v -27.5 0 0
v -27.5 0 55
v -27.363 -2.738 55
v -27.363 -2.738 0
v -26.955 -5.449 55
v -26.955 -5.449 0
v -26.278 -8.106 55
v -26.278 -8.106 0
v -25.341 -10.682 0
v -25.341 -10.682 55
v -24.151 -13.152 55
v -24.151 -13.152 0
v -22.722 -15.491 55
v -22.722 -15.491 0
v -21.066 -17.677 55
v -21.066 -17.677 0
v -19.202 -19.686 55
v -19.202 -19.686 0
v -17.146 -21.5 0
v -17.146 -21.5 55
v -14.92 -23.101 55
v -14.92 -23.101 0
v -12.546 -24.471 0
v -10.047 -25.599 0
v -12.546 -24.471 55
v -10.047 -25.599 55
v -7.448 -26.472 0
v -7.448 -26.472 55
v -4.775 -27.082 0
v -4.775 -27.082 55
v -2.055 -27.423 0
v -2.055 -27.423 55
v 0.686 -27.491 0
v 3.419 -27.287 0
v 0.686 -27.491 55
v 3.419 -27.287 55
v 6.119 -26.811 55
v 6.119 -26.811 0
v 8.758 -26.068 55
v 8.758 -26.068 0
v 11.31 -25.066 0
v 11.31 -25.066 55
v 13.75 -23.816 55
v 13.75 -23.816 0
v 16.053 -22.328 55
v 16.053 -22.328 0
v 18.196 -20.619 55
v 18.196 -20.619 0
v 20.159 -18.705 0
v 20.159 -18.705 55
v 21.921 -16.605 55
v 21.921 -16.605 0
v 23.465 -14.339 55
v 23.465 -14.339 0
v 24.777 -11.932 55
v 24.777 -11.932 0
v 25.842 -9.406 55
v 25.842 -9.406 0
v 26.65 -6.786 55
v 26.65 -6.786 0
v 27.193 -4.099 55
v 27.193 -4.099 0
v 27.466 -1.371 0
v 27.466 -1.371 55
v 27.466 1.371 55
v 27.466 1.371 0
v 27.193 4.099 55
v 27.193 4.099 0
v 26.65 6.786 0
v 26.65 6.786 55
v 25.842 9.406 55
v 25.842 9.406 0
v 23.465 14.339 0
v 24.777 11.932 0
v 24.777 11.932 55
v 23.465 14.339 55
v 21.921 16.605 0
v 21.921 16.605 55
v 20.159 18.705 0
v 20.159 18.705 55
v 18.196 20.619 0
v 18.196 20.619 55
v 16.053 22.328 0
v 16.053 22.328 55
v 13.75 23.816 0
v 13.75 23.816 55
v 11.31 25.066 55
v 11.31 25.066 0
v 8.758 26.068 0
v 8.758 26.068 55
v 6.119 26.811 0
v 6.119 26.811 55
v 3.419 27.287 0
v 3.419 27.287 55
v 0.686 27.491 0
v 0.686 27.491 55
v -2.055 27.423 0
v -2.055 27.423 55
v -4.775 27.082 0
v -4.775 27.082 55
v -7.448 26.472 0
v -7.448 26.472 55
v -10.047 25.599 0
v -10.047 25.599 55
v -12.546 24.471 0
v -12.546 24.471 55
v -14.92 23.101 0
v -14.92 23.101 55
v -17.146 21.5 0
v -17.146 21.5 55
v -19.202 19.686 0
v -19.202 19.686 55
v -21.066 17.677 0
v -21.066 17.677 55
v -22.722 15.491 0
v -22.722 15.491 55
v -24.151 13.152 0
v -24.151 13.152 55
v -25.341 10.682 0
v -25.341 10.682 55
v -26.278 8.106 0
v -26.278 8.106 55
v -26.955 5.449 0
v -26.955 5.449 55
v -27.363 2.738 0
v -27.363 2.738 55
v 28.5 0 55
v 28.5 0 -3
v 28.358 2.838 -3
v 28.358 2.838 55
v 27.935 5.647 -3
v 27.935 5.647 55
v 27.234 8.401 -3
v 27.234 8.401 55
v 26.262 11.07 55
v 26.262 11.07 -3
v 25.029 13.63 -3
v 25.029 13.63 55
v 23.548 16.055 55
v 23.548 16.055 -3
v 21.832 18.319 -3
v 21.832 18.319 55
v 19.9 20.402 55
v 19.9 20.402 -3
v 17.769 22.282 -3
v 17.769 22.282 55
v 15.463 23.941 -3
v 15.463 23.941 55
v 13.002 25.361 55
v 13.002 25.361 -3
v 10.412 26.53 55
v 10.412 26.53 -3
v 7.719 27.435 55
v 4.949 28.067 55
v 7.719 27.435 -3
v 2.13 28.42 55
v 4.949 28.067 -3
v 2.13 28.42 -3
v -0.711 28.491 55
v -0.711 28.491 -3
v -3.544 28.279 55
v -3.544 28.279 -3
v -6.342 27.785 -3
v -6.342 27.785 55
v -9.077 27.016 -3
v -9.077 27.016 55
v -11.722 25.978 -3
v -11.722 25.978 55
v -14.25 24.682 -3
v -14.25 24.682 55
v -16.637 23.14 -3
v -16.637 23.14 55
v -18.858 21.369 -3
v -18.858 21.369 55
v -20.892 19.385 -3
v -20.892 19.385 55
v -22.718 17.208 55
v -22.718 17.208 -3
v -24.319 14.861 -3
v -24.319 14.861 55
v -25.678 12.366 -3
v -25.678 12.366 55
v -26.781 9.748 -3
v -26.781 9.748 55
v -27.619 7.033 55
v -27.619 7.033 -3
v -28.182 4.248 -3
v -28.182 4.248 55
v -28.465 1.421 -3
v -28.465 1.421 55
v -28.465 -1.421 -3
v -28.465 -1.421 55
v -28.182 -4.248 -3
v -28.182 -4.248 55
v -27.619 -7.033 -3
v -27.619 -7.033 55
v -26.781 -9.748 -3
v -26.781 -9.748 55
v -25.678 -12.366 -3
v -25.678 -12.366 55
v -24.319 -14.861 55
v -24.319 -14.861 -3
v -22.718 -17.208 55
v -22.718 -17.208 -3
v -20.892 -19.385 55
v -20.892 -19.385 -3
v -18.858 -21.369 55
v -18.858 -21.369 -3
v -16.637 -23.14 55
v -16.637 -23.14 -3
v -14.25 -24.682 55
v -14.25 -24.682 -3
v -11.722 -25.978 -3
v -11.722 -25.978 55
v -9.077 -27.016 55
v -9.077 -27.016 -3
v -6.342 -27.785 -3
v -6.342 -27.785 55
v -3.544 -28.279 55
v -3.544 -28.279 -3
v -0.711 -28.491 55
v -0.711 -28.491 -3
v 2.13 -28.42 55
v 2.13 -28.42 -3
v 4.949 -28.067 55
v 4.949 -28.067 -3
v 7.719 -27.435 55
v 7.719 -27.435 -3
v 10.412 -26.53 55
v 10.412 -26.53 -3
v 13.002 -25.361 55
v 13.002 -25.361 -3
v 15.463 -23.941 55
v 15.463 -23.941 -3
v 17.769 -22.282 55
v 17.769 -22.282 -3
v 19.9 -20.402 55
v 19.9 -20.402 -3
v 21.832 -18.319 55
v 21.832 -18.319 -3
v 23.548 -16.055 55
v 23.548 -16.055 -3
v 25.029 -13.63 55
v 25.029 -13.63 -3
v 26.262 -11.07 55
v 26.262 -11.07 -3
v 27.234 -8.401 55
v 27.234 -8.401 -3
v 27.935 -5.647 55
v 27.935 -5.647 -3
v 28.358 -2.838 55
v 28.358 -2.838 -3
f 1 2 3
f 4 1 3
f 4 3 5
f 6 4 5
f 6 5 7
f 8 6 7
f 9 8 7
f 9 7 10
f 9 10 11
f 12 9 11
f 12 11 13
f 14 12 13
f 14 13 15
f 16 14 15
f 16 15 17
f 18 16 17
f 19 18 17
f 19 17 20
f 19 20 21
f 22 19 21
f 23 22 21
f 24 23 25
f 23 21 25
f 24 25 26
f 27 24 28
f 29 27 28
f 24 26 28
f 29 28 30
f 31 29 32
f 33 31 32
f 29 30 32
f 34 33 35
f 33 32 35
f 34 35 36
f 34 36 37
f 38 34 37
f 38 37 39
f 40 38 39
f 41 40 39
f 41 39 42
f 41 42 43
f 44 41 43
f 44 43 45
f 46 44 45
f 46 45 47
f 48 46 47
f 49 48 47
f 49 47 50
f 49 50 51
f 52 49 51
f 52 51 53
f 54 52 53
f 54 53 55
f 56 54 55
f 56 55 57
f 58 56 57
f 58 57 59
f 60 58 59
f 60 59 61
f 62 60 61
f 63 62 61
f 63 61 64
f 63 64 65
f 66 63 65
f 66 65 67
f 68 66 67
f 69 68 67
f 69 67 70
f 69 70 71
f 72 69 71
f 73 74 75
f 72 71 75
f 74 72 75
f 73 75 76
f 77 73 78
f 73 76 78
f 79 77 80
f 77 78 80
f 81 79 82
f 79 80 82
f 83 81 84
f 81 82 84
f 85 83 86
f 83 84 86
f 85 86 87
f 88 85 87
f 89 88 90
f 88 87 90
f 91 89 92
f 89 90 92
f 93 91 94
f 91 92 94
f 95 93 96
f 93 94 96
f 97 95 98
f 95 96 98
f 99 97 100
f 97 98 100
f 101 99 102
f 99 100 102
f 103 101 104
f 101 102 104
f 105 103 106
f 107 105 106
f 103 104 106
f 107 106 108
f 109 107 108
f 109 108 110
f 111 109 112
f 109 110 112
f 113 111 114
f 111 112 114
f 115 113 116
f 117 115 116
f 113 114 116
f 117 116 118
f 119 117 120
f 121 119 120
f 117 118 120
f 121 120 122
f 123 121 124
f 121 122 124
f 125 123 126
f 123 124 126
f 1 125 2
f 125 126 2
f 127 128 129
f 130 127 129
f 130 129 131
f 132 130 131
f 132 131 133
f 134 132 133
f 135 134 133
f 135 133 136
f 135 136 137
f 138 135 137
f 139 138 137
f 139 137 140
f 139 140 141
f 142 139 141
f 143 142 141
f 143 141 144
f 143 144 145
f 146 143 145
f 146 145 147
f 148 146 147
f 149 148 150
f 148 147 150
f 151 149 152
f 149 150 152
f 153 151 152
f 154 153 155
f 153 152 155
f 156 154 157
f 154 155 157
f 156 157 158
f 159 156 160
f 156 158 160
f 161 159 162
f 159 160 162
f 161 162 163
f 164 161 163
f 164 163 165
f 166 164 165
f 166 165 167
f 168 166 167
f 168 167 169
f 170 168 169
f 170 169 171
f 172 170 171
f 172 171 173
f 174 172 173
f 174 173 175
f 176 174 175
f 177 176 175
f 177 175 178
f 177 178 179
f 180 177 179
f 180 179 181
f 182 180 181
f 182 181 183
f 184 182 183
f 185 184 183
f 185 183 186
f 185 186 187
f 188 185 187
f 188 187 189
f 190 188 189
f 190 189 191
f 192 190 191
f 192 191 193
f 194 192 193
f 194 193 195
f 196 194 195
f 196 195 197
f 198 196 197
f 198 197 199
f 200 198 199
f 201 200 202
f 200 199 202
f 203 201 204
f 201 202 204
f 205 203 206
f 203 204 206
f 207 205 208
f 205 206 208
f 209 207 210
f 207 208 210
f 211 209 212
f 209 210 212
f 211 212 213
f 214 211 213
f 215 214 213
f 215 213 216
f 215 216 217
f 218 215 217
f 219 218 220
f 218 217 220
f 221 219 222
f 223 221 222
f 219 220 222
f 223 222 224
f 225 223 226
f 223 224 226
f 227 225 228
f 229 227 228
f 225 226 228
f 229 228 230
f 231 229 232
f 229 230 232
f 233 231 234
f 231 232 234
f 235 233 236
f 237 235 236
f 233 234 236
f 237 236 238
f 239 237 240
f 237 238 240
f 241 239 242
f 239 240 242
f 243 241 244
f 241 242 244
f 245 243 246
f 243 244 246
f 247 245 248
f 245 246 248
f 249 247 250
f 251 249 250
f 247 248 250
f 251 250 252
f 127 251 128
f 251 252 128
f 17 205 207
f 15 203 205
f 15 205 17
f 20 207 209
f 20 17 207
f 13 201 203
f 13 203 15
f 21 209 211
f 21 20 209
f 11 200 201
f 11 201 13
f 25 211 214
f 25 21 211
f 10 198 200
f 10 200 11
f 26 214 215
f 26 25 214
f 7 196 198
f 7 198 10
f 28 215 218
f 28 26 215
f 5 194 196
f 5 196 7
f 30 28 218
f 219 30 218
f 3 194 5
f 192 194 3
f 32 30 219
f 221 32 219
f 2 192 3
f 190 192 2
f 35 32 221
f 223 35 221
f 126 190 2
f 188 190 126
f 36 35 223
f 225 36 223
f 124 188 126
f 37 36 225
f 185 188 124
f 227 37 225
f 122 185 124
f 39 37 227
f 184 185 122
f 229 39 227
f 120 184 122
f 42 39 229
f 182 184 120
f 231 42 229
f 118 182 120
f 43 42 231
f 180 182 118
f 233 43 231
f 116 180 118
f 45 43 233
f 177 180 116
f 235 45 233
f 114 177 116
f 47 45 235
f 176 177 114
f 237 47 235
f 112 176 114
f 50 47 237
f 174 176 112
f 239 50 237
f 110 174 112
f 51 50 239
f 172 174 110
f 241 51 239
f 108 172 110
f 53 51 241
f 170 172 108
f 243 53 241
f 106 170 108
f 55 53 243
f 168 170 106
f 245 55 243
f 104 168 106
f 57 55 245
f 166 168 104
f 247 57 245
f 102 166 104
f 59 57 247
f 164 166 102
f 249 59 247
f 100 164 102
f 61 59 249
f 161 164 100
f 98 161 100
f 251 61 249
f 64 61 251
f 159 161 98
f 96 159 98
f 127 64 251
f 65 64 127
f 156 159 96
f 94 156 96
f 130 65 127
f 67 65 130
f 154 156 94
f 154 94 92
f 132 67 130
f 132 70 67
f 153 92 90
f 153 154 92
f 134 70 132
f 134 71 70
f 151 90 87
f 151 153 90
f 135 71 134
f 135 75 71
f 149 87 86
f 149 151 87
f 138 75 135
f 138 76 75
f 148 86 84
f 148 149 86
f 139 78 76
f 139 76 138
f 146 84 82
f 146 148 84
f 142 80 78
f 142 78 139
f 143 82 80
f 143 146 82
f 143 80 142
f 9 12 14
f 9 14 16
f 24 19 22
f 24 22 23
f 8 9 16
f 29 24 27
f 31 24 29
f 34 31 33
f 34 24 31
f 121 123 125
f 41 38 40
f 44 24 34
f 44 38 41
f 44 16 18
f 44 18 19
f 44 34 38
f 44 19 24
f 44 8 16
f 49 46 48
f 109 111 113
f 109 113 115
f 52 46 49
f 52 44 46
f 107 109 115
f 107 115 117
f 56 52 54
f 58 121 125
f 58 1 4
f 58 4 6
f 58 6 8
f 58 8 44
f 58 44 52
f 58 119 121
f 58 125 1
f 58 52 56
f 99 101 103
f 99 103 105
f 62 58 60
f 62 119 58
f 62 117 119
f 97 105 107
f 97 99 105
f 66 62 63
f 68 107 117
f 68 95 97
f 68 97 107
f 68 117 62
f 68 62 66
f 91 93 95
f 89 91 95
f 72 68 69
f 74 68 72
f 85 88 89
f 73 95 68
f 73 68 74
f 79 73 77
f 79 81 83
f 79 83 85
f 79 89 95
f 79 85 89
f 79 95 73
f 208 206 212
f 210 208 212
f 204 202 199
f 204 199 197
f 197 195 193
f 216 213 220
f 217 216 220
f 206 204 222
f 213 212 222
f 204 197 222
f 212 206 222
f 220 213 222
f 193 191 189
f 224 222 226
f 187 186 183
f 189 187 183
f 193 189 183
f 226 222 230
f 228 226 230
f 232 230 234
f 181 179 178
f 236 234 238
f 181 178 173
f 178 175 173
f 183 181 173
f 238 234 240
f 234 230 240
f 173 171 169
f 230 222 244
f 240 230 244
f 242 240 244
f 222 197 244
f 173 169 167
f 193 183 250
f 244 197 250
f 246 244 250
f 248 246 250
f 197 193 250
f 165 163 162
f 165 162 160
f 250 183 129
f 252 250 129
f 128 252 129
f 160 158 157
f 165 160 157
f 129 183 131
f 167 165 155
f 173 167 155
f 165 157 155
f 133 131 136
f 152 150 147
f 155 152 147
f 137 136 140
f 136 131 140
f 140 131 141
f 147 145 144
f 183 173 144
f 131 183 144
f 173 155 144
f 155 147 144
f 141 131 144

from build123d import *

# Parameters (mm, degrees)
F1_R     = 28.5
F2_DEPTH = 55
F3_D     = 55
F5_R     = 28.5
F6_DEPTH = 3


with BuildPart() as f2:
    # F1 (on Top) → F2 (new body)
    with BuildSketch(Plane.XY):
        Circle(F1_R)
    extrude(amount=F2_DEPTH)

    # F3 (through all)
    with Locations(Plane(origin=(0, 0, 0), x_dir=(1, 0, 0), z_dir=(0, 0, -1))):
        with Locations((0, 0)):
            Hole(F3_D / 2)

    # F5 (on offset) → F6 (join)
    with BuildSketch(Plane.XY.offset(-3)):
        Circle(F5_R)
    extrude(amount=F6_DEPTH)


solid = f2.part
